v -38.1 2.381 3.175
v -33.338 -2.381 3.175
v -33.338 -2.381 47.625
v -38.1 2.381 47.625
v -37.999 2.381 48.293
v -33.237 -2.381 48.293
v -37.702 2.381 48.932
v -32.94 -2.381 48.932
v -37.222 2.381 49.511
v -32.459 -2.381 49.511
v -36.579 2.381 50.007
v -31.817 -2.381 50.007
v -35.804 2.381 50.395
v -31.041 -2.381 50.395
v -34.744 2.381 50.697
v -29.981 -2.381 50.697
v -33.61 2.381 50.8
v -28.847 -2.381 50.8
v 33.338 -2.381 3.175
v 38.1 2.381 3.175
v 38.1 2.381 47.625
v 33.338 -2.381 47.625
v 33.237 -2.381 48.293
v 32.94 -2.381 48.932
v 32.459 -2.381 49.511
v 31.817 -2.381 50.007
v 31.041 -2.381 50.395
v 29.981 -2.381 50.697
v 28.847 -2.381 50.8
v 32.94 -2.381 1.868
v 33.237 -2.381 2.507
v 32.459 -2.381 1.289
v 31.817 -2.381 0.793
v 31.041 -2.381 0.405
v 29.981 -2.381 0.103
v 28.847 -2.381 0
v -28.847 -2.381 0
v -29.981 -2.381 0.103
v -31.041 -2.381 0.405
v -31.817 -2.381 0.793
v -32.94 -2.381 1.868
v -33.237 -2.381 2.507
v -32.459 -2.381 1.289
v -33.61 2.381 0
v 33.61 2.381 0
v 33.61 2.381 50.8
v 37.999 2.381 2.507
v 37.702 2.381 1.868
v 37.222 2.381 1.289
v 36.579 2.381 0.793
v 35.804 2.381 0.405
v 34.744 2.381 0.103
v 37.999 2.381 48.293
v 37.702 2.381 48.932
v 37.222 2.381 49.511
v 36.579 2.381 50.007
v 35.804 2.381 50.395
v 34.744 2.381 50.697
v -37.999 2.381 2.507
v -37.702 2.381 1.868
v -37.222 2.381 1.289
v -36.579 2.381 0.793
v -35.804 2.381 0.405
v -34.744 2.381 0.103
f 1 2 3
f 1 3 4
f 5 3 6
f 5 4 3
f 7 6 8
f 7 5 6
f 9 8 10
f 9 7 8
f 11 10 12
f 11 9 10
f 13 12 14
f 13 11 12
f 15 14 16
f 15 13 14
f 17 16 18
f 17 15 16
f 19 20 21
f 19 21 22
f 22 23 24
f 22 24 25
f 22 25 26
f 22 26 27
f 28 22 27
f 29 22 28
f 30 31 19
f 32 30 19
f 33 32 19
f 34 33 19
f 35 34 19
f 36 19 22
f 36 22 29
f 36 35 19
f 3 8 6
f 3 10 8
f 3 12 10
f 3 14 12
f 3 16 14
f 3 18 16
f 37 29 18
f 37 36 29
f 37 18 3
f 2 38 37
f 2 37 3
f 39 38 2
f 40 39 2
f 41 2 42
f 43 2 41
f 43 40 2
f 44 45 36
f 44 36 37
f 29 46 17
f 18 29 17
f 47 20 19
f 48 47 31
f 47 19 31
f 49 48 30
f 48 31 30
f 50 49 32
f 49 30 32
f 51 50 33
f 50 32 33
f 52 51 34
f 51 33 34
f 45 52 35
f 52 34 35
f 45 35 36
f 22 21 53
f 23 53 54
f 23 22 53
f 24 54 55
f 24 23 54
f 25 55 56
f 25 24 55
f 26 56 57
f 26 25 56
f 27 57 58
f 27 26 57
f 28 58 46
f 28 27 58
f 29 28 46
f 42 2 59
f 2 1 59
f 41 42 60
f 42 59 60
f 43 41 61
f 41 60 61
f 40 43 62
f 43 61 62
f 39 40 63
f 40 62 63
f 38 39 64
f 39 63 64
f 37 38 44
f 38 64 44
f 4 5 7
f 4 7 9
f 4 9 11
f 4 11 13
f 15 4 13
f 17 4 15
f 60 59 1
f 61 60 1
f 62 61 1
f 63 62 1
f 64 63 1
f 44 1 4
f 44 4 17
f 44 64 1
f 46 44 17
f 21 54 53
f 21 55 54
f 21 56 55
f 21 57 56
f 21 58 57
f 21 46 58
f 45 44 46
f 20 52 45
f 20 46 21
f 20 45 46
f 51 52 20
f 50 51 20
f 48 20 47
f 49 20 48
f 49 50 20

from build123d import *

# Parameters (mm, degrees)
BOSS_EXTRUDE1_DEPTH = 50.8
FILLET1_R           = 3.175


with BuildPart() as part:
    # Sketch1 → Boss-Extrude1 (new body)
    with BuildSketch(Plane.XY):
        Polygon((-38.1, 2.38125), (38.1, 2.38125), (33.3375, -2.38125), (-33.3375, -2.38125), align=None)
    extrude(amount=BOSS_EXTRUDE1_DEPTH)

    # Fillet1
    fillet1_edges = [part.edges().sort_by_distance(p)[0] for p in [
        (35.71875, 0, 50.8),
        (-35.71875, 0, 50.8),
        (35.71875, 0, 0),
        (-35.71875, 0, 0),
    ]]
    fillet(fillet1_edges, radius=FILLET1_R)


solid = part.part
